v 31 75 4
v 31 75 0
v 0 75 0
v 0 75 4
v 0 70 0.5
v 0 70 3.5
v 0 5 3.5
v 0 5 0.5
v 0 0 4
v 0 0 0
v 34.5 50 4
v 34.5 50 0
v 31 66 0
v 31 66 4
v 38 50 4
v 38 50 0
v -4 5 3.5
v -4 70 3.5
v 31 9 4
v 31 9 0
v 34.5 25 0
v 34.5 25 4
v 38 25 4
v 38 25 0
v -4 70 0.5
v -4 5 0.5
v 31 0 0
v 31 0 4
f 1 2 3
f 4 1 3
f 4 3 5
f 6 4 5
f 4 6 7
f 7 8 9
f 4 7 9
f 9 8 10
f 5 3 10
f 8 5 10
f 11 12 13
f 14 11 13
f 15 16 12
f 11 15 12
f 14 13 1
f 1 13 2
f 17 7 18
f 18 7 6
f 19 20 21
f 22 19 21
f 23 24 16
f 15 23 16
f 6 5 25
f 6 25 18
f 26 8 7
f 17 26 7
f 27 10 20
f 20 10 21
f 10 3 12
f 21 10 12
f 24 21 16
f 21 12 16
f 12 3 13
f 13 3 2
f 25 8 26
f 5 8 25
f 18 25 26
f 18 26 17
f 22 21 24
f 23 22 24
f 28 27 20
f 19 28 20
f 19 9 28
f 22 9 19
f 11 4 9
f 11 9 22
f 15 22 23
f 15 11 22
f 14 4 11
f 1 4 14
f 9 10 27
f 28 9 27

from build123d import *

# Parameters (mm, degrees)
BOSS_EXTRUDE1_DEPTH = 4
SKETCH3_W           = 3
SKETCH3_H           = 65
BOSS_EXTRUDE2_DEPTH = 4


with BuildPart() as part:
    # Sketch1 → Boss-Extrude1 (new body)
    with BuildSketch(Plane.XY):
        Polygon((0, 0), (31, 0), (31, 9), (34.5, 25), (38, 25), (38, 50), (34.5, 50), (31, 66), (31, 75), (0, 75), align=None)
    extrude(amount=BOSS_EXTRUDE1_DEPTH)

    # Sketch3 → Boss-Extrude2 (add)
    with BuildSketch(Plane.ZY):
        with Locations((2, 37.5)):
            Rectangle(SKETCH3_W, SKETCH3_H)
    extrude(amount=BOSS_EXTRUDE2_DEPTH)


solid = part.part
